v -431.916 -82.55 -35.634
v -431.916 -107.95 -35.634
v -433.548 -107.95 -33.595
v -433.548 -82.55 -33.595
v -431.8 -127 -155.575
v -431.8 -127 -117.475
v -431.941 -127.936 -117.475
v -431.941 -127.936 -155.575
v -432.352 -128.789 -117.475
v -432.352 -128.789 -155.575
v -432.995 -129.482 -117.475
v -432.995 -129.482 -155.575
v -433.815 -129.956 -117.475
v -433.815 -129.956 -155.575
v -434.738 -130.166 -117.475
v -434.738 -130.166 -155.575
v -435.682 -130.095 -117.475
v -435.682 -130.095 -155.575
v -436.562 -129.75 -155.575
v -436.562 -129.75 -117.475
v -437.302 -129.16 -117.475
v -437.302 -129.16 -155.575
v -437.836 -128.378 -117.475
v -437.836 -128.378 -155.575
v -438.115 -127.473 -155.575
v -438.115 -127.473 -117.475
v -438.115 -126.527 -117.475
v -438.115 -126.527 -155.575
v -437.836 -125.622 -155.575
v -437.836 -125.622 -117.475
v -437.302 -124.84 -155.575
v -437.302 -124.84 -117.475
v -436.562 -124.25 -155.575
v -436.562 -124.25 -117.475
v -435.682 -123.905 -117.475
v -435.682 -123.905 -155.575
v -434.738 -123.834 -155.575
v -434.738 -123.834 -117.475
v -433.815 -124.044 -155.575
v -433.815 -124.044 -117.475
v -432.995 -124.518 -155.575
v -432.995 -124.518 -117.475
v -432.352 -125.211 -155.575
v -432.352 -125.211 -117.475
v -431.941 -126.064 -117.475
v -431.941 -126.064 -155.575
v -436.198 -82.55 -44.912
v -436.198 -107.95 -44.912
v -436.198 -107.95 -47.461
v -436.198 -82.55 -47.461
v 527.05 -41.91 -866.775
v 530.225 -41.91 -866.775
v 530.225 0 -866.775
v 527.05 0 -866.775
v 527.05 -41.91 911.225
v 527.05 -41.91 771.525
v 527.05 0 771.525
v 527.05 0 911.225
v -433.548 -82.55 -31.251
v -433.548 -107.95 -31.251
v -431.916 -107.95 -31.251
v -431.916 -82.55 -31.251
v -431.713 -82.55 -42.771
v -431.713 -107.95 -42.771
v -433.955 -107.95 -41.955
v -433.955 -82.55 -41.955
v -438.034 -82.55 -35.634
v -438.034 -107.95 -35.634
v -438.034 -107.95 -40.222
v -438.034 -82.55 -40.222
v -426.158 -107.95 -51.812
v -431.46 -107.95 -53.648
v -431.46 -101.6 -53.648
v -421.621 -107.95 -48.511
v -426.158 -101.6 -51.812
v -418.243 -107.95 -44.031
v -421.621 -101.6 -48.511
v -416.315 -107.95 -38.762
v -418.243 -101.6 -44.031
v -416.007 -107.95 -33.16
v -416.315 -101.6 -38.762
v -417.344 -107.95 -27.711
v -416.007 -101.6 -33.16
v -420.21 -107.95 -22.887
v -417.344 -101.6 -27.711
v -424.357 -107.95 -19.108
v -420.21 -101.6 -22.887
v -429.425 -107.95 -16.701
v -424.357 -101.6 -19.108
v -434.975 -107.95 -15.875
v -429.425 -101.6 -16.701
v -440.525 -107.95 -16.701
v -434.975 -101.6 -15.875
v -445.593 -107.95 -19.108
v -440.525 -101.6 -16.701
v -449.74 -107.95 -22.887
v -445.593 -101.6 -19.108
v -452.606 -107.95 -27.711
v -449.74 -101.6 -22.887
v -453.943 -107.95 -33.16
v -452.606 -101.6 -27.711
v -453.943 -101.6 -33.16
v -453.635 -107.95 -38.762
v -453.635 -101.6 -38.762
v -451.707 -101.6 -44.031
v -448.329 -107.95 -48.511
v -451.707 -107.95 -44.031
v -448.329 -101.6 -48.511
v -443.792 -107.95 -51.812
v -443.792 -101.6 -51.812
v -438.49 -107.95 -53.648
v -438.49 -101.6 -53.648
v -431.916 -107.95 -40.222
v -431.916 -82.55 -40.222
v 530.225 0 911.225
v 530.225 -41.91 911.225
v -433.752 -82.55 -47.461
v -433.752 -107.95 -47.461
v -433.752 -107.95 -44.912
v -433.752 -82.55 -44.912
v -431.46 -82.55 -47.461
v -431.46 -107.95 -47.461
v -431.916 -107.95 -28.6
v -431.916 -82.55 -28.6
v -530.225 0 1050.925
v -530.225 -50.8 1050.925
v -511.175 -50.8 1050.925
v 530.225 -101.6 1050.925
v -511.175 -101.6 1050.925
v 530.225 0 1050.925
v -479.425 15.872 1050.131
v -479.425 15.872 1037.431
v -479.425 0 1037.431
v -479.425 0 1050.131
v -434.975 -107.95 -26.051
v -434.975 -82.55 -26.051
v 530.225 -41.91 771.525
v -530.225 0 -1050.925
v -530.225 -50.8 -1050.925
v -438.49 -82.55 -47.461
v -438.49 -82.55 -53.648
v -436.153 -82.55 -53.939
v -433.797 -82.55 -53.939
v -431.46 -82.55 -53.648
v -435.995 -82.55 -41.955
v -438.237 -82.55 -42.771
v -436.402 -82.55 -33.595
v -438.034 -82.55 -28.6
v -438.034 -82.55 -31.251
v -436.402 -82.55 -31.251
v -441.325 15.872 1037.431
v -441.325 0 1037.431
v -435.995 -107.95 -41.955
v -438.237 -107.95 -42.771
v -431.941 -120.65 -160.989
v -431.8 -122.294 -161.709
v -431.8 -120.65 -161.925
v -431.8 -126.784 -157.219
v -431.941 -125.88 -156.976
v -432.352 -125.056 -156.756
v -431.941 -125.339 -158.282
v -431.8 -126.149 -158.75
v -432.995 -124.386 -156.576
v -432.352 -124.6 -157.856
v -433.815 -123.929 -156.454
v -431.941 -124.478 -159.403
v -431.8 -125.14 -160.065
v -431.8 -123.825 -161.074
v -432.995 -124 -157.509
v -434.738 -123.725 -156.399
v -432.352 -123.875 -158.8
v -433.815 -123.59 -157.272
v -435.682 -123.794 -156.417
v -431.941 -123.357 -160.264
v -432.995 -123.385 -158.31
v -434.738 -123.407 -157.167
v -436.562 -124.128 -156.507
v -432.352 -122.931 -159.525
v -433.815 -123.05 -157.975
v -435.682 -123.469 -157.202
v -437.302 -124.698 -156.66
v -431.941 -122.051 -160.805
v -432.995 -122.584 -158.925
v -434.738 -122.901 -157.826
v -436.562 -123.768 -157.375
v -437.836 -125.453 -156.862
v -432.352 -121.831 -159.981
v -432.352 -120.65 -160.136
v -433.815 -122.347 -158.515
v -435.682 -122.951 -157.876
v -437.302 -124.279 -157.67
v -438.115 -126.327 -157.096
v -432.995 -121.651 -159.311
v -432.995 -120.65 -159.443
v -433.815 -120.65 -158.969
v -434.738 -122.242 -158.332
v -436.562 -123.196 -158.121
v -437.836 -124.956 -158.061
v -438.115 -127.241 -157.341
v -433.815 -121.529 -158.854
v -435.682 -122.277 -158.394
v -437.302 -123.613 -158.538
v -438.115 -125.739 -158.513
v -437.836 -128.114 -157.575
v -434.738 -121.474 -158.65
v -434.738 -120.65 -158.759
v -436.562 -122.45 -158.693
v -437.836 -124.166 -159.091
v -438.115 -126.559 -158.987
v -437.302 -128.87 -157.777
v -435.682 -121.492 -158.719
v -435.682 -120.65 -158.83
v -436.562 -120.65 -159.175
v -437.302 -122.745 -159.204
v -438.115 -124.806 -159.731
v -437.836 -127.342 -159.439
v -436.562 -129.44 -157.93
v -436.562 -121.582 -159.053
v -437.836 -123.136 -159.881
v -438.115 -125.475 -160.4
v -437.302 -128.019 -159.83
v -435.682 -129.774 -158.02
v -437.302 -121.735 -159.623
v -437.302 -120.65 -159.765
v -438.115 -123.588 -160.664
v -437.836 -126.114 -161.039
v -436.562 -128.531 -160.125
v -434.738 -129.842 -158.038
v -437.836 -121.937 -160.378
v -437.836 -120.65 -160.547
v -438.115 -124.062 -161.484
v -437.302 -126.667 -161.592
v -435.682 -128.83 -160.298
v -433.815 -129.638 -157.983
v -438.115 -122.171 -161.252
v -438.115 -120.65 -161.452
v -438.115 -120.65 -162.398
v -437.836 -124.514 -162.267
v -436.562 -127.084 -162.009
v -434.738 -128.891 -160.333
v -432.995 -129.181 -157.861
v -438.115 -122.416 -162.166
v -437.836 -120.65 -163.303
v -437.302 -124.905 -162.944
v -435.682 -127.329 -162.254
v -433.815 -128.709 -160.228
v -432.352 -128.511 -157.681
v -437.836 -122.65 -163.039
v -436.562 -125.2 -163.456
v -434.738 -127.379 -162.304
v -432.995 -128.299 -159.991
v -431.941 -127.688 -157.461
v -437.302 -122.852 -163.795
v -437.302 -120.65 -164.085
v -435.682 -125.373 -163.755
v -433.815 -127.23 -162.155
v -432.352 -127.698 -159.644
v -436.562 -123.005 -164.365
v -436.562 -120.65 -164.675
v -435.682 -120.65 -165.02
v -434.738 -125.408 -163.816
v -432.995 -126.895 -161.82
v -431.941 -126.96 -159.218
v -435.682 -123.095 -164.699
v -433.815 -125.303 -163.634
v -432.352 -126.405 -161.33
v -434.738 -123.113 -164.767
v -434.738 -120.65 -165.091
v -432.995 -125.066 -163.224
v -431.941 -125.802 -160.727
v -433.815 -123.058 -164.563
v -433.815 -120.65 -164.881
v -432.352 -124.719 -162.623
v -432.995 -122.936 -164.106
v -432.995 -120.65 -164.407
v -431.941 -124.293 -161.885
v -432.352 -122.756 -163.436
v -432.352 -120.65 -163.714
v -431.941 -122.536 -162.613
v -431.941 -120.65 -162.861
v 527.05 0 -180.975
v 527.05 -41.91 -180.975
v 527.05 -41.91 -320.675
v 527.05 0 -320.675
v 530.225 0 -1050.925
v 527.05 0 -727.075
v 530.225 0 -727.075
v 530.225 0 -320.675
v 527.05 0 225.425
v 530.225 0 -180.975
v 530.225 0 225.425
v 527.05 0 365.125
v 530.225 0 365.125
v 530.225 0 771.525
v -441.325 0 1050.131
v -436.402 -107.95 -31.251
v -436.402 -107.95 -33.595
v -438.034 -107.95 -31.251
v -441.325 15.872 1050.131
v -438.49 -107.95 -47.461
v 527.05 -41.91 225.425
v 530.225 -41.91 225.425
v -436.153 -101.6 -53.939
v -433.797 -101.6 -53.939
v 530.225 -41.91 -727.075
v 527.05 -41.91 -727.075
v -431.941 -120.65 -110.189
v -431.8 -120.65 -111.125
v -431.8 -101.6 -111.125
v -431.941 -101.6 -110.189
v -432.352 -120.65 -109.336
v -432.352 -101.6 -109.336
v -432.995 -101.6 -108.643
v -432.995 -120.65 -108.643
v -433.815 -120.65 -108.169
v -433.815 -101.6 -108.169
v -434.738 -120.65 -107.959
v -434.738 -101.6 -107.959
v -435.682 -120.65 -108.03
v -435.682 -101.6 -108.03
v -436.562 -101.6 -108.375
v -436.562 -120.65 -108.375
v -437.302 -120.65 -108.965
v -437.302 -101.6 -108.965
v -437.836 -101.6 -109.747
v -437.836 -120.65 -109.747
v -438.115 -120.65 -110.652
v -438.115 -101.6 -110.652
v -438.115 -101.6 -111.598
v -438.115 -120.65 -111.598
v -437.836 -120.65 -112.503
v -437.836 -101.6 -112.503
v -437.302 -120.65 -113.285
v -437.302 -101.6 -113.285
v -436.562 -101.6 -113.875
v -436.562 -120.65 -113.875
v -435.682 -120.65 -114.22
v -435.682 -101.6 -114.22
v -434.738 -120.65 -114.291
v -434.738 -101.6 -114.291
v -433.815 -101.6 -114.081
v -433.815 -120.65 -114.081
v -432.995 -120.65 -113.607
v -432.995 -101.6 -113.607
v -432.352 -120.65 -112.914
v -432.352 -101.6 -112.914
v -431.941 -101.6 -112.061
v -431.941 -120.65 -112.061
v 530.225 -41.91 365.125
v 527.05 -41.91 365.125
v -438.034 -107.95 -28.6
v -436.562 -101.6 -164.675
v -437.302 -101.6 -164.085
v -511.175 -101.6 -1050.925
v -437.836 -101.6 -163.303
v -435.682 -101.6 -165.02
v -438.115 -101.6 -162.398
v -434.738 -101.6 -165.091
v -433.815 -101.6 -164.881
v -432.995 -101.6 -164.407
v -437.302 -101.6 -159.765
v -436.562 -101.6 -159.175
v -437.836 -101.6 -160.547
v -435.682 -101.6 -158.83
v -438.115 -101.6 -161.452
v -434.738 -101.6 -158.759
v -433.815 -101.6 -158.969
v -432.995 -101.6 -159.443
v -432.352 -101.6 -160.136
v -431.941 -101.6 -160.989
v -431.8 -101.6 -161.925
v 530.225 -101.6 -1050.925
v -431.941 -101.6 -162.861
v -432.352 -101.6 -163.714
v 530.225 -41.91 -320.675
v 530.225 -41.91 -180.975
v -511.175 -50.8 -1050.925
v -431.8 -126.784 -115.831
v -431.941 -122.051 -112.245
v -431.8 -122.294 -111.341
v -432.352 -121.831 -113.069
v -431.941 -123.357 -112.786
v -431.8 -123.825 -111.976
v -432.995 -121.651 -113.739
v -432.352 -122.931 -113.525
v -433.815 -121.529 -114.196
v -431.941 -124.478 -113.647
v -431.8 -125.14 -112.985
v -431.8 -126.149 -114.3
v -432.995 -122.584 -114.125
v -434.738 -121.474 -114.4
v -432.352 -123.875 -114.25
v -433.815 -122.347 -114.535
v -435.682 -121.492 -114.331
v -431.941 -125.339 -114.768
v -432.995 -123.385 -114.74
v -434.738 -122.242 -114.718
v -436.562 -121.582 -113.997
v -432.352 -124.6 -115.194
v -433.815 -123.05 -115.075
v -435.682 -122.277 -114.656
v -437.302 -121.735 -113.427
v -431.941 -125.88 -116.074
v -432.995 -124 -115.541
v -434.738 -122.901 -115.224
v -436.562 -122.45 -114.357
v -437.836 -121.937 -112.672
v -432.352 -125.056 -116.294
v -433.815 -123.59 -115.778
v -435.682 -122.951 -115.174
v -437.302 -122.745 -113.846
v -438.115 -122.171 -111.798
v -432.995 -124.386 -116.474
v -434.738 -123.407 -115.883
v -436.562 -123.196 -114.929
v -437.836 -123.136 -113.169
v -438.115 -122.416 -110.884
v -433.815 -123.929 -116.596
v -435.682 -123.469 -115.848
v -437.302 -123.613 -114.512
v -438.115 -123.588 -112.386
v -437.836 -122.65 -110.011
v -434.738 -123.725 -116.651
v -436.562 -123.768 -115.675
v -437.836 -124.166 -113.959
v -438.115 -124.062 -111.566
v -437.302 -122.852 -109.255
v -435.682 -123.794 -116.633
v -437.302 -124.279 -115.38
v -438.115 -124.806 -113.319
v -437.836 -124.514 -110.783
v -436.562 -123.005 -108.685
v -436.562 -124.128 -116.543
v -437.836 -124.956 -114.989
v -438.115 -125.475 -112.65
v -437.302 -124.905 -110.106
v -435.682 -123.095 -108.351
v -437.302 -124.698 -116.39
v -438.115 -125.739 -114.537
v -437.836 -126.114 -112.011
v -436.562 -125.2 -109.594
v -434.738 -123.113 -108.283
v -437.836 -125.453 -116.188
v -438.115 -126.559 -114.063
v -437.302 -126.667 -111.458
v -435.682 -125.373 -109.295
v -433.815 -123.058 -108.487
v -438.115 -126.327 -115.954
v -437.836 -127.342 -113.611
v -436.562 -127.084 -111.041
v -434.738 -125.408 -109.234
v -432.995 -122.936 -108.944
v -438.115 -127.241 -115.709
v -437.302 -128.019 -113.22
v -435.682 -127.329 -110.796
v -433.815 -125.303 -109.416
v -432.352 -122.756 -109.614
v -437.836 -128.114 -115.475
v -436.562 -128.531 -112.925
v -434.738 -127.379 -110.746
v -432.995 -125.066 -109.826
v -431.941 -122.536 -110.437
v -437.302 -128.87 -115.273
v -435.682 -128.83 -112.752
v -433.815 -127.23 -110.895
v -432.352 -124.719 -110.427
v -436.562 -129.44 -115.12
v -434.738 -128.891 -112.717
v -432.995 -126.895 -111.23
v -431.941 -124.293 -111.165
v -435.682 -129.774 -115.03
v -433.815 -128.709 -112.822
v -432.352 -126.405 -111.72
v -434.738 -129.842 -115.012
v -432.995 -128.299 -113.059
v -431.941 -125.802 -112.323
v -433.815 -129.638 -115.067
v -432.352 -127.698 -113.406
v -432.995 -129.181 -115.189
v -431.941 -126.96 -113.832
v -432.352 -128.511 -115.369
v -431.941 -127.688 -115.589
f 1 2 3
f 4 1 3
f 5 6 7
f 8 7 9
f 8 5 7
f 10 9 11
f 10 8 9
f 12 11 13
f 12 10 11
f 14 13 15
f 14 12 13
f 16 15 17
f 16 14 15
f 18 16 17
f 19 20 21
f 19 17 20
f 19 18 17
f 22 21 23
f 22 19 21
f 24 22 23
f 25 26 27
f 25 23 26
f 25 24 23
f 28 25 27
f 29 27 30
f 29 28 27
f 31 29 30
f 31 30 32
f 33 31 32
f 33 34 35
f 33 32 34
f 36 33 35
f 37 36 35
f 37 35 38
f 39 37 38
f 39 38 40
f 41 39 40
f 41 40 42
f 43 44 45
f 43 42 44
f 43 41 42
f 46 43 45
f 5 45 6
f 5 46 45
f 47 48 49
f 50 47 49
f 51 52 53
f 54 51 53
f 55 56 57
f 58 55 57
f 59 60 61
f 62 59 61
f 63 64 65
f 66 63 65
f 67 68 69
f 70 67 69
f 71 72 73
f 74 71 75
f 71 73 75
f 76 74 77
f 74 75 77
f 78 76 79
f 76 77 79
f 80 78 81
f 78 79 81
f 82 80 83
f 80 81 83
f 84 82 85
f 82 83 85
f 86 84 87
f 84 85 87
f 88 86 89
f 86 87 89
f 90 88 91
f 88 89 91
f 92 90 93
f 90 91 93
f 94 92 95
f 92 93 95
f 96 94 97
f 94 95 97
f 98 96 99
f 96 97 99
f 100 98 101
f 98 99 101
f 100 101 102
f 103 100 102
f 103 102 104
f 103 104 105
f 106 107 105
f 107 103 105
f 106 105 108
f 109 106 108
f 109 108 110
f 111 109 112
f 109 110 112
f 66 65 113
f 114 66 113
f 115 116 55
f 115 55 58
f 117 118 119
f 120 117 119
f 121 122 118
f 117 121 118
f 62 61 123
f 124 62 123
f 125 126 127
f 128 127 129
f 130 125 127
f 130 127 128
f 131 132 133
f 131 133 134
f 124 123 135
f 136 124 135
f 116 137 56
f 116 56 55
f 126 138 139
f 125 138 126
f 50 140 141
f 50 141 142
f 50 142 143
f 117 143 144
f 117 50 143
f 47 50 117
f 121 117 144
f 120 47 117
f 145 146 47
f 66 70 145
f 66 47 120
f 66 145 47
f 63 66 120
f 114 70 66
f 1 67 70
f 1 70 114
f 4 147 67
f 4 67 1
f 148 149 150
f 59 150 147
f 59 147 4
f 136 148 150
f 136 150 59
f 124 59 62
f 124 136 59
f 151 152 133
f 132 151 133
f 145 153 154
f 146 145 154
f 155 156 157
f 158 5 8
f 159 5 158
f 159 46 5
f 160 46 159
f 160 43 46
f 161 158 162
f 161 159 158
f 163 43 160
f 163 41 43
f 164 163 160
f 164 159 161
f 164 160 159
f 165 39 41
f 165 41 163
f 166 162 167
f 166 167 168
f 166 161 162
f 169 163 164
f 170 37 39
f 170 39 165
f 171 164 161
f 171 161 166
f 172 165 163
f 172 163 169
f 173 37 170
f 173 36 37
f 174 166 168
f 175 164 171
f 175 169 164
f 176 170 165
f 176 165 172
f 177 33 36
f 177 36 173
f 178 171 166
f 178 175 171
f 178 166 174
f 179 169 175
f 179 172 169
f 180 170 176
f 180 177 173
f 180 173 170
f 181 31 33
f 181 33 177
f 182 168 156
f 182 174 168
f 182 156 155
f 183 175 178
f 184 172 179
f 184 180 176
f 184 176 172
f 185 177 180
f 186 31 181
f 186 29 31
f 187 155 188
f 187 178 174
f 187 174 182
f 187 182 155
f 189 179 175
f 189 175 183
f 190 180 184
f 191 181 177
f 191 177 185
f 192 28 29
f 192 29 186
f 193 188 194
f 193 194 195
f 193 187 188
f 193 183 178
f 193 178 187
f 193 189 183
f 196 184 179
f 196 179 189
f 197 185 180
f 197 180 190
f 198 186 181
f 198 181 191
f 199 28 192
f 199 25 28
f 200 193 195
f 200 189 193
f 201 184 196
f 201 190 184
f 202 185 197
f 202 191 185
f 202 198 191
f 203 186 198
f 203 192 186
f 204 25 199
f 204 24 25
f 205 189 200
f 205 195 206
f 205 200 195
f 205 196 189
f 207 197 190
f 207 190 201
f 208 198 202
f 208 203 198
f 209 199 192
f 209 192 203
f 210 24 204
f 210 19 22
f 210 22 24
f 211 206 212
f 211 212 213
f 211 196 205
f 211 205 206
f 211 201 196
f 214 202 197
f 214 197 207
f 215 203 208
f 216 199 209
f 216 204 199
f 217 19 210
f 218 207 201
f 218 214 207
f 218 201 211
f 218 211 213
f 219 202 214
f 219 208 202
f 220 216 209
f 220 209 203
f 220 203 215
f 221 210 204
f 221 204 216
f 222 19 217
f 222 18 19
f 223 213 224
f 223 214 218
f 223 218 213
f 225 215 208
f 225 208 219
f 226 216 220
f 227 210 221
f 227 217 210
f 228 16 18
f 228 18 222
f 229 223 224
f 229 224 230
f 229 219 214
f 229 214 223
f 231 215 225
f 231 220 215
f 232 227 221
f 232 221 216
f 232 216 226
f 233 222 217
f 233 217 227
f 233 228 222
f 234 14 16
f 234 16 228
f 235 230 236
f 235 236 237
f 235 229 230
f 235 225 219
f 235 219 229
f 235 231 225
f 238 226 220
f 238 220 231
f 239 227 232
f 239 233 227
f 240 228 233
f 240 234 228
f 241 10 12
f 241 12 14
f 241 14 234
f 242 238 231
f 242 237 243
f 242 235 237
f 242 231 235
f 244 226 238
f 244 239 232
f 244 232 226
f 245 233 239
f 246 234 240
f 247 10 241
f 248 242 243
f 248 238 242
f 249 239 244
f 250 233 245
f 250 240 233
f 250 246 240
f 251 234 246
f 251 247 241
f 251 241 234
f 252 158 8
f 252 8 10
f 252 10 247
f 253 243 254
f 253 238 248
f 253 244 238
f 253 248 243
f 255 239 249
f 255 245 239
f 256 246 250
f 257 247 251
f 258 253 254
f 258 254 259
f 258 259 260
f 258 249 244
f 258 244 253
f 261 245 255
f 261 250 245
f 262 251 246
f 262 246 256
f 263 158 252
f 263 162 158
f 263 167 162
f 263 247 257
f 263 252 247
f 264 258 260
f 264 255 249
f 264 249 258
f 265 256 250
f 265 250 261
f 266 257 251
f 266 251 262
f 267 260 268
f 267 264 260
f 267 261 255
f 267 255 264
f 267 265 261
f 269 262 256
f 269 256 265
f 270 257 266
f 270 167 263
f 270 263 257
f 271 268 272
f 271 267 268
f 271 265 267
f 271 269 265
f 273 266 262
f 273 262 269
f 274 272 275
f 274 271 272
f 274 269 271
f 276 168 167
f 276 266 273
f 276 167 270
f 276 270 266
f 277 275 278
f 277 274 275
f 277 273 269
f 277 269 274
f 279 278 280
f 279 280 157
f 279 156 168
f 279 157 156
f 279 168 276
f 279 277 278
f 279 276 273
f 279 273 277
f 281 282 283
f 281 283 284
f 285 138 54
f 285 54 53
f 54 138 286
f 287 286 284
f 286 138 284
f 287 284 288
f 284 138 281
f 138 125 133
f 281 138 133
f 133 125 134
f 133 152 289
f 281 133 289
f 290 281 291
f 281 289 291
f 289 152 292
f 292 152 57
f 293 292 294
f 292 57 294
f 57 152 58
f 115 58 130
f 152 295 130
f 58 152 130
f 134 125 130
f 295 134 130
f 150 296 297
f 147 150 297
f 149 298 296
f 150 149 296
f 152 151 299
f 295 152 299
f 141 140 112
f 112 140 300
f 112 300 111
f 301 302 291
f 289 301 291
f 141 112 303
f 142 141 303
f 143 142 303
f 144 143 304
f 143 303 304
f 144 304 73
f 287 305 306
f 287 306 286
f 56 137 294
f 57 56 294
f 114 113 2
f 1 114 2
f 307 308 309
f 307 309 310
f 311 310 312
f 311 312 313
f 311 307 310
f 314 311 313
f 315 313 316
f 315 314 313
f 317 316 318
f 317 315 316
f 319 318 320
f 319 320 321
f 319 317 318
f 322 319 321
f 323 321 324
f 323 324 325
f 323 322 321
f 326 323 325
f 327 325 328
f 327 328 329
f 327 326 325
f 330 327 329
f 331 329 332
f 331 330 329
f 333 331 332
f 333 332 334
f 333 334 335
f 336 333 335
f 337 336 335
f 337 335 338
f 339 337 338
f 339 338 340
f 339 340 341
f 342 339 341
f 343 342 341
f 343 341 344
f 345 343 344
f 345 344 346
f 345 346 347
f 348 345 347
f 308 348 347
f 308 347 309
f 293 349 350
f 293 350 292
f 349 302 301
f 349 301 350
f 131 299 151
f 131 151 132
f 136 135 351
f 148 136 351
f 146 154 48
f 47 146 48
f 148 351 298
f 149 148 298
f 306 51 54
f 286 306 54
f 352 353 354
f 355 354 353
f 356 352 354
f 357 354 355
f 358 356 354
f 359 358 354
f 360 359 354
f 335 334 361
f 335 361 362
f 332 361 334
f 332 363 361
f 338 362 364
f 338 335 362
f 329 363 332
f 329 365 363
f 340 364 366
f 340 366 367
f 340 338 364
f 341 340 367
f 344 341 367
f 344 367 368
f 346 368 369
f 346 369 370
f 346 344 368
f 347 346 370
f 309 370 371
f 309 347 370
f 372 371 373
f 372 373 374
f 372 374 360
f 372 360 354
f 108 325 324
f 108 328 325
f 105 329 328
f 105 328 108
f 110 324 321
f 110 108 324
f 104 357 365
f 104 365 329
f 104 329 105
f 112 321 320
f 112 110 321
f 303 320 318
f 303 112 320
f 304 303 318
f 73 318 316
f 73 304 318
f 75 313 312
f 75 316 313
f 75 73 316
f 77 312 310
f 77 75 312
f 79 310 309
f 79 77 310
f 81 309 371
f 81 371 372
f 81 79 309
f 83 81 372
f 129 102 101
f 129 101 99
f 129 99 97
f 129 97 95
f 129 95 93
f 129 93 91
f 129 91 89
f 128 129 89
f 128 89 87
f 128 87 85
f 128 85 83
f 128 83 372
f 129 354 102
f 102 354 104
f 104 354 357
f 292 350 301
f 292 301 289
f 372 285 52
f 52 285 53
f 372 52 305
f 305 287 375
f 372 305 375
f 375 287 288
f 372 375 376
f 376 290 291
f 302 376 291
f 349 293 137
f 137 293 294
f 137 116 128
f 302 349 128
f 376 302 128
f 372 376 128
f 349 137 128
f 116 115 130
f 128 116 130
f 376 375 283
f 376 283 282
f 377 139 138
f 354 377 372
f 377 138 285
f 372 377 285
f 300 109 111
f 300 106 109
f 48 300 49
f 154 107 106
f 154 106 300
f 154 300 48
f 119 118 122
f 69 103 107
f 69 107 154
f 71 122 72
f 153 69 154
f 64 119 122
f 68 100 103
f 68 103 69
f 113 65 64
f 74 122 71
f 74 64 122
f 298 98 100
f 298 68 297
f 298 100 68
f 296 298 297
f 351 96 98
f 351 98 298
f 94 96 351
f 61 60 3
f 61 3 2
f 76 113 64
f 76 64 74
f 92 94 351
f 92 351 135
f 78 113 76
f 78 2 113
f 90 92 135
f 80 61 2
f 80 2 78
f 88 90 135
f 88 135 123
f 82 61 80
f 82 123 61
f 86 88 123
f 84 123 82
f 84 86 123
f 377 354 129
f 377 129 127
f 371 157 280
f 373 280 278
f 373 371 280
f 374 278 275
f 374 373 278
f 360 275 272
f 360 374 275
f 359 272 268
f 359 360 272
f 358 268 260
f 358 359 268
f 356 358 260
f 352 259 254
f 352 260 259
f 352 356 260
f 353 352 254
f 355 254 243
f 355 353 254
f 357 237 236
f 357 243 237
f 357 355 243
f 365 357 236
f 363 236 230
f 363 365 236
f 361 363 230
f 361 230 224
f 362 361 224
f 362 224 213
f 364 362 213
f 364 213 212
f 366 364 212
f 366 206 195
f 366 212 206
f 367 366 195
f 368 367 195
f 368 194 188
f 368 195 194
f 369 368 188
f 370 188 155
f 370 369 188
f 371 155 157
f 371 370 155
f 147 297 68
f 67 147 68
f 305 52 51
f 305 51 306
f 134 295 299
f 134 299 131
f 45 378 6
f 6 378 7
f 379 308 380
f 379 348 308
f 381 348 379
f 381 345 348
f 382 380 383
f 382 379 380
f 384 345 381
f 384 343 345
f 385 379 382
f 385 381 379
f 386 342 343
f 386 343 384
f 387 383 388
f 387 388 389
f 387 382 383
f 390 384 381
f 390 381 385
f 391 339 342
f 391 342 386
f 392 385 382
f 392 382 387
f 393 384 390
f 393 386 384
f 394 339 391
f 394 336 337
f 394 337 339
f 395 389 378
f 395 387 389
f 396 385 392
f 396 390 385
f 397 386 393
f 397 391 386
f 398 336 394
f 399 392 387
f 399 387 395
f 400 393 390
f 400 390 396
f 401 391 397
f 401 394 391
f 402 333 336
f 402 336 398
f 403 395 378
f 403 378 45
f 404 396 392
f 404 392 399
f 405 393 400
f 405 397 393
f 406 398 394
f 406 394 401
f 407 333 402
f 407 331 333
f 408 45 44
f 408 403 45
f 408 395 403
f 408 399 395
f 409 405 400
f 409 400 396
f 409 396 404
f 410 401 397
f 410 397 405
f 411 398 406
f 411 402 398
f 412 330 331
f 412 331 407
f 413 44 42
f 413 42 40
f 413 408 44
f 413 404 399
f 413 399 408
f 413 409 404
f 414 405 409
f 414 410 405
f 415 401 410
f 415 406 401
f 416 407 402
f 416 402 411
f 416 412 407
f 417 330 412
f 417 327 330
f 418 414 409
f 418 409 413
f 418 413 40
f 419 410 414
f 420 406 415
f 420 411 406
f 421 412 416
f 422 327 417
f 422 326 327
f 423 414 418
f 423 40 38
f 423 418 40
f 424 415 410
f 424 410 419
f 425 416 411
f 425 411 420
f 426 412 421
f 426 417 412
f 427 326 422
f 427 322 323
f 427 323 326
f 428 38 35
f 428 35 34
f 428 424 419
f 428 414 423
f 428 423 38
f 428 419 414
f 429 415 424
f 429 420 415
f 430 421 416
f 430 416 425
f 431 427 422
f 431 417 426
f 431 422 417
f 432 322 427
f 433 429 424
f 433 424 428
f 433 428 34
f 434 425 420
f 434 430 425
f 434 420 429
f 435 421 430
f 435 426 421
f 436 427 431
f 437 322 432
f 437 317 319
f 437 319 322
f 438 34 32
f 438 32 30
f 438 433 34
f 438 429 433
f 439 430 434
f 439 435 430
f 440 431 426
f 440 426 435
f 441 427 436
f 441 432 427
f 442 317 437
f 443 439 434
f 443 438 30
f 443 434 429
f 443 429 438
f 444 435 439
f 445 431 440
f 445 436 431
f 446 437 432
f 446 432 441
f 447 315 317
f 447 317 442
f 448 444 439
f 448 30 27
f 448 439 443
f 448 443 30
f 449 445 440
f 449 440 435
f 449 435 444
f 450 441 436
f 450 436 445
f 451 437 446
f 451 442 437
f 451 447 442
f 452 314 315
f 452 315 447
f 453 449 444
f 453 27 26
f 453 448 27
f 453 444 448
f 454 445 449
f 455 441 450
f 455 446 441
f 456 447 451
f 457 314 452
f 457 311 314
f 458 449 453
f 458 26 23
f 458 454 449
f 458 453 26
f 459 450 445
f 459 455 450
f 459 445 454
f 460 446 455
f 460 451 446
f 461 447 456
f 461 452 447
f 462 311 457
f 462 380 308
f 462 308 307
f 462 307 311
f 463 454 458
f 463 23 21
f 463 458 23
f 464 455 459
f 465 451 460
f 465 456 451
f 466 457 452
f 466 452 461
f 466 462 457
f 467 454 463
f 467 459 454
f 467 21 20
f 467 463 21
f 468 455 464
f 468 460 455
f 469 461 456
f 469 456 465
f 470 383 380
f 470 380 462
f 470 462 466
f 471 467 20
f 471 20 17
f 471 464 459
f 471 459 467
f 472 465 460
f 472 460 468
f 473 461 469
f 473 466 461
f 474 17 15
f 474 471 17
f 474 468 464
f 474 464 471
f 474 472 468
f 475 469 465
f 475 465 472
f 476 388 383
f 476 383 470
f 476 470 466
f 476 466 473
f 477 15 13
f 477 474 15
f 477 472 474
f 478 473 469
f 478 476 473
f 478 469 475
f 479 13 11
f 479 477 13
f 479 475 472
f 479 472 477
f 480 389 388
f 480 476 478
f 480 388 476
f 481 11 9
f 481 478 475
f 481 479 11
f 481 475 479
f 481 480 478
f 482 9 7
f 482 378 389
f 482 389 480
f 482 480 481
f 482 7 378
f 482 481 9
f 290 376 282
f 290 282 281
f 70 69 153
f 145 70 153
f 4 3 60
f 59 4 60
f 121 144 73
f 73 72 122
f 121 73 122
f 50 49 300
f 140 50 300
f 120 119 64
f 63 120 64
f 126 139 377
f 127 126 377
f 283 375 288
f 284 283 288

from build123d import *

# Parameters (mm, degrees)
F0_W      = 1060.45
F0_H      = 2101.85
F1_DEPTH  = 101.6
F2_W      = 19.05
F2_H      = 50.8
F3_DEPTH  = 2101.85
F4_W      = 41.91
F4_H      = 139.7
F5_DEPTH  = 3.175
F6_R      = 3.175
F10_W     = 38.1
F10_H     = 12.7
F11_DEPTH = 15.87246
F12_R     = 19.05
F13_DEPTH = 6.35
F15_DEPTH = 25.4


with BuildPart() as f1:
    # F0 (on Front) → F1 (new body)
    with BuildSketch(Plane.XZ):
        Rectangle(F0_W, F0_H)
    extrude(amount=F1_DEPTH)

    # F2 (on face) → F3 (cut, through all)
    with BuildSketch(Plane.XY.offset(1050.925)):
        with Locations((-520.7, -76.2)):
            Rectangle(F2_W, F2_H)
    extrude(amount=-F3_DEPTH, mode=Mode.SUBTRACT)

    # F4 (on face) → F5 (cut)
    with BuildSketch(Plane.YZ.offset(530.225)):
        with Locations((-20.955, -796.925)):
            Rectangle(F4_W, F4_H)
        with Locations((-20.955, -250.825)):
            Rectangle(F4_W, F4_H)
        with Locations((-20.955, 295.275)):
            Rectangle(F4_W, F4_H)
        with Locations((-20.955, 841.375)):
            Rectangle(F4_W, F4_H)
    extrude(amount=-F5_DEPTH, mode=Mode.SUBTRACT)

    # F9: sweep along a path in F8
    with BuildLine(Plane(origin=(-434.975, 0, 0), x_dir=(0, -1, 0), z_dir=(-1, 0, 0))) as f9_path:
        Line((101.6, -111.125), (120.65, -111.125))
        ThreePointArc((120.65, -111.125), (125.1401280605, -112.9848719395), (127, -117.475))
        Line((127, -117.475), (127, -155.575))
        ThreePointArc((127, -155.575), (125.1401280605, -160.0651280606), (120.65, -161.925))
        Line((120.65, -161.925), (101.6, -161.925))
    # F6 (on face) → F9 (sweep)
    with BuildSketch(Plane.XZ.offset(101.6)):
        with Locations((-434.975, -111.125)):
            Circle(F6_R)
    sweep(path=f9_path.line)

    # F10 (on face) → F11 (join)
    with BuildSketch(Plane(origin=(0, 0, 0), x_dir=(-1, 0, 0), z_dir=(0, 1, 0))):
        with Locations((460.375, 1043.78125)):
            Rectangle(F10_W, F10_H)
    extrude(amount=F11_DEPTH)

    # F12 (on face) → F13 (join)
    with BuildSketch(Plane.XZ.offset(101.6)):
        with Locations((-434.975, -34.925)):
            Circle(F12_R)
    extrude(amount=F13_DEPTH)

    # F14 (on face) → F15 (cut)
    with BuildSketch(Plane.XZ.offset(107.95)):
        with BuildLine():
            Line((-438.4902051281, -47.4607607431), (-438.4902051281, -53.6478692488))
            ThreePointArc((-438.4902051281, -53.6478692488), (-434.975, -53.975), (-431.4597948719, -53.6478692488))
            Line((-431.4597948719, -53.6478692488), (-431.4597948719, -47.4607607431))
            Line((-431.4597948719, -47.4607607431), (-433.7515848637, -47.4607607431))
            Line((-433.7515848637, -47.4607607431), (-433.7515848637, -44.9119880795))
            Line((-433.7515848637, -44.9119880795), (-431.7125695705, -42.7710190415))
            Line((-431.7125695705, -42.7710190415), (-433.9554923534, -41.9554114342))
            Line((-433.9554923534, -41.9554114342), (-431.9164770603, -40.2222499251))
            Line((-431.9164770603, -40.2222499251), (-431.9164770603, -35.634458065))
            Line((-431.9164770603, -35.634458065), (-433.5476773739, -33.5954427719))
            Line((-433.5476773739, -33.5954427719), (-433.5476773739, -31.2505699694))
            Line((-433.5476773739, -31.2505699694), (-431.9164770603, -31.2505699694))
            Line((-431.9164770603, -31.2505699694), (-431.9164770603, -28.5998471081))
            Line((-431.9164770603, -28.5998471081), (-434.975, -26.0510761291))
            Line((-434.975, -26.0510761291), (-438.0335229397, -28.5998471081))
            Line((-438.0335229397, -28.5998471081), (-438.0335229397, -31.2505699694))
            Line((-438.0335229397, -31.2505699694), (-436.4023226261, -31.2505699694))
            Line((-436.4023226261, -31.2505699694), (-436.4023226261, -33.5954427719))
            Line((-436.4023226261, -33.5954427719), (-438.0335229397, -35.634458065))
            Line((-438.0335229397, -35.634458065), (-438.0335229397, -40.2222499251))
            Line((-438.0335229397, -40.2222499251), (-435.9945076466, -41.9554114342))
            Line((-435.9945076466, -41.9554114342), (-438.2374304295, -42.7710190415))
            Line((-438.2374304295, -42.7710190415), (-436.1984151363, -44.9119880795))
            Line((-436.1984151363, -44.9119880795), (-436.1984151363, -47.4607607431))
            Line((-436.1984151363, -47.4607607431), (-438.4902051281, -47.4607607431))
        make_face()
    extrude(amount=-F15_DEPTH, mode=Mode.SUBTRACT)


solid = f1.part
